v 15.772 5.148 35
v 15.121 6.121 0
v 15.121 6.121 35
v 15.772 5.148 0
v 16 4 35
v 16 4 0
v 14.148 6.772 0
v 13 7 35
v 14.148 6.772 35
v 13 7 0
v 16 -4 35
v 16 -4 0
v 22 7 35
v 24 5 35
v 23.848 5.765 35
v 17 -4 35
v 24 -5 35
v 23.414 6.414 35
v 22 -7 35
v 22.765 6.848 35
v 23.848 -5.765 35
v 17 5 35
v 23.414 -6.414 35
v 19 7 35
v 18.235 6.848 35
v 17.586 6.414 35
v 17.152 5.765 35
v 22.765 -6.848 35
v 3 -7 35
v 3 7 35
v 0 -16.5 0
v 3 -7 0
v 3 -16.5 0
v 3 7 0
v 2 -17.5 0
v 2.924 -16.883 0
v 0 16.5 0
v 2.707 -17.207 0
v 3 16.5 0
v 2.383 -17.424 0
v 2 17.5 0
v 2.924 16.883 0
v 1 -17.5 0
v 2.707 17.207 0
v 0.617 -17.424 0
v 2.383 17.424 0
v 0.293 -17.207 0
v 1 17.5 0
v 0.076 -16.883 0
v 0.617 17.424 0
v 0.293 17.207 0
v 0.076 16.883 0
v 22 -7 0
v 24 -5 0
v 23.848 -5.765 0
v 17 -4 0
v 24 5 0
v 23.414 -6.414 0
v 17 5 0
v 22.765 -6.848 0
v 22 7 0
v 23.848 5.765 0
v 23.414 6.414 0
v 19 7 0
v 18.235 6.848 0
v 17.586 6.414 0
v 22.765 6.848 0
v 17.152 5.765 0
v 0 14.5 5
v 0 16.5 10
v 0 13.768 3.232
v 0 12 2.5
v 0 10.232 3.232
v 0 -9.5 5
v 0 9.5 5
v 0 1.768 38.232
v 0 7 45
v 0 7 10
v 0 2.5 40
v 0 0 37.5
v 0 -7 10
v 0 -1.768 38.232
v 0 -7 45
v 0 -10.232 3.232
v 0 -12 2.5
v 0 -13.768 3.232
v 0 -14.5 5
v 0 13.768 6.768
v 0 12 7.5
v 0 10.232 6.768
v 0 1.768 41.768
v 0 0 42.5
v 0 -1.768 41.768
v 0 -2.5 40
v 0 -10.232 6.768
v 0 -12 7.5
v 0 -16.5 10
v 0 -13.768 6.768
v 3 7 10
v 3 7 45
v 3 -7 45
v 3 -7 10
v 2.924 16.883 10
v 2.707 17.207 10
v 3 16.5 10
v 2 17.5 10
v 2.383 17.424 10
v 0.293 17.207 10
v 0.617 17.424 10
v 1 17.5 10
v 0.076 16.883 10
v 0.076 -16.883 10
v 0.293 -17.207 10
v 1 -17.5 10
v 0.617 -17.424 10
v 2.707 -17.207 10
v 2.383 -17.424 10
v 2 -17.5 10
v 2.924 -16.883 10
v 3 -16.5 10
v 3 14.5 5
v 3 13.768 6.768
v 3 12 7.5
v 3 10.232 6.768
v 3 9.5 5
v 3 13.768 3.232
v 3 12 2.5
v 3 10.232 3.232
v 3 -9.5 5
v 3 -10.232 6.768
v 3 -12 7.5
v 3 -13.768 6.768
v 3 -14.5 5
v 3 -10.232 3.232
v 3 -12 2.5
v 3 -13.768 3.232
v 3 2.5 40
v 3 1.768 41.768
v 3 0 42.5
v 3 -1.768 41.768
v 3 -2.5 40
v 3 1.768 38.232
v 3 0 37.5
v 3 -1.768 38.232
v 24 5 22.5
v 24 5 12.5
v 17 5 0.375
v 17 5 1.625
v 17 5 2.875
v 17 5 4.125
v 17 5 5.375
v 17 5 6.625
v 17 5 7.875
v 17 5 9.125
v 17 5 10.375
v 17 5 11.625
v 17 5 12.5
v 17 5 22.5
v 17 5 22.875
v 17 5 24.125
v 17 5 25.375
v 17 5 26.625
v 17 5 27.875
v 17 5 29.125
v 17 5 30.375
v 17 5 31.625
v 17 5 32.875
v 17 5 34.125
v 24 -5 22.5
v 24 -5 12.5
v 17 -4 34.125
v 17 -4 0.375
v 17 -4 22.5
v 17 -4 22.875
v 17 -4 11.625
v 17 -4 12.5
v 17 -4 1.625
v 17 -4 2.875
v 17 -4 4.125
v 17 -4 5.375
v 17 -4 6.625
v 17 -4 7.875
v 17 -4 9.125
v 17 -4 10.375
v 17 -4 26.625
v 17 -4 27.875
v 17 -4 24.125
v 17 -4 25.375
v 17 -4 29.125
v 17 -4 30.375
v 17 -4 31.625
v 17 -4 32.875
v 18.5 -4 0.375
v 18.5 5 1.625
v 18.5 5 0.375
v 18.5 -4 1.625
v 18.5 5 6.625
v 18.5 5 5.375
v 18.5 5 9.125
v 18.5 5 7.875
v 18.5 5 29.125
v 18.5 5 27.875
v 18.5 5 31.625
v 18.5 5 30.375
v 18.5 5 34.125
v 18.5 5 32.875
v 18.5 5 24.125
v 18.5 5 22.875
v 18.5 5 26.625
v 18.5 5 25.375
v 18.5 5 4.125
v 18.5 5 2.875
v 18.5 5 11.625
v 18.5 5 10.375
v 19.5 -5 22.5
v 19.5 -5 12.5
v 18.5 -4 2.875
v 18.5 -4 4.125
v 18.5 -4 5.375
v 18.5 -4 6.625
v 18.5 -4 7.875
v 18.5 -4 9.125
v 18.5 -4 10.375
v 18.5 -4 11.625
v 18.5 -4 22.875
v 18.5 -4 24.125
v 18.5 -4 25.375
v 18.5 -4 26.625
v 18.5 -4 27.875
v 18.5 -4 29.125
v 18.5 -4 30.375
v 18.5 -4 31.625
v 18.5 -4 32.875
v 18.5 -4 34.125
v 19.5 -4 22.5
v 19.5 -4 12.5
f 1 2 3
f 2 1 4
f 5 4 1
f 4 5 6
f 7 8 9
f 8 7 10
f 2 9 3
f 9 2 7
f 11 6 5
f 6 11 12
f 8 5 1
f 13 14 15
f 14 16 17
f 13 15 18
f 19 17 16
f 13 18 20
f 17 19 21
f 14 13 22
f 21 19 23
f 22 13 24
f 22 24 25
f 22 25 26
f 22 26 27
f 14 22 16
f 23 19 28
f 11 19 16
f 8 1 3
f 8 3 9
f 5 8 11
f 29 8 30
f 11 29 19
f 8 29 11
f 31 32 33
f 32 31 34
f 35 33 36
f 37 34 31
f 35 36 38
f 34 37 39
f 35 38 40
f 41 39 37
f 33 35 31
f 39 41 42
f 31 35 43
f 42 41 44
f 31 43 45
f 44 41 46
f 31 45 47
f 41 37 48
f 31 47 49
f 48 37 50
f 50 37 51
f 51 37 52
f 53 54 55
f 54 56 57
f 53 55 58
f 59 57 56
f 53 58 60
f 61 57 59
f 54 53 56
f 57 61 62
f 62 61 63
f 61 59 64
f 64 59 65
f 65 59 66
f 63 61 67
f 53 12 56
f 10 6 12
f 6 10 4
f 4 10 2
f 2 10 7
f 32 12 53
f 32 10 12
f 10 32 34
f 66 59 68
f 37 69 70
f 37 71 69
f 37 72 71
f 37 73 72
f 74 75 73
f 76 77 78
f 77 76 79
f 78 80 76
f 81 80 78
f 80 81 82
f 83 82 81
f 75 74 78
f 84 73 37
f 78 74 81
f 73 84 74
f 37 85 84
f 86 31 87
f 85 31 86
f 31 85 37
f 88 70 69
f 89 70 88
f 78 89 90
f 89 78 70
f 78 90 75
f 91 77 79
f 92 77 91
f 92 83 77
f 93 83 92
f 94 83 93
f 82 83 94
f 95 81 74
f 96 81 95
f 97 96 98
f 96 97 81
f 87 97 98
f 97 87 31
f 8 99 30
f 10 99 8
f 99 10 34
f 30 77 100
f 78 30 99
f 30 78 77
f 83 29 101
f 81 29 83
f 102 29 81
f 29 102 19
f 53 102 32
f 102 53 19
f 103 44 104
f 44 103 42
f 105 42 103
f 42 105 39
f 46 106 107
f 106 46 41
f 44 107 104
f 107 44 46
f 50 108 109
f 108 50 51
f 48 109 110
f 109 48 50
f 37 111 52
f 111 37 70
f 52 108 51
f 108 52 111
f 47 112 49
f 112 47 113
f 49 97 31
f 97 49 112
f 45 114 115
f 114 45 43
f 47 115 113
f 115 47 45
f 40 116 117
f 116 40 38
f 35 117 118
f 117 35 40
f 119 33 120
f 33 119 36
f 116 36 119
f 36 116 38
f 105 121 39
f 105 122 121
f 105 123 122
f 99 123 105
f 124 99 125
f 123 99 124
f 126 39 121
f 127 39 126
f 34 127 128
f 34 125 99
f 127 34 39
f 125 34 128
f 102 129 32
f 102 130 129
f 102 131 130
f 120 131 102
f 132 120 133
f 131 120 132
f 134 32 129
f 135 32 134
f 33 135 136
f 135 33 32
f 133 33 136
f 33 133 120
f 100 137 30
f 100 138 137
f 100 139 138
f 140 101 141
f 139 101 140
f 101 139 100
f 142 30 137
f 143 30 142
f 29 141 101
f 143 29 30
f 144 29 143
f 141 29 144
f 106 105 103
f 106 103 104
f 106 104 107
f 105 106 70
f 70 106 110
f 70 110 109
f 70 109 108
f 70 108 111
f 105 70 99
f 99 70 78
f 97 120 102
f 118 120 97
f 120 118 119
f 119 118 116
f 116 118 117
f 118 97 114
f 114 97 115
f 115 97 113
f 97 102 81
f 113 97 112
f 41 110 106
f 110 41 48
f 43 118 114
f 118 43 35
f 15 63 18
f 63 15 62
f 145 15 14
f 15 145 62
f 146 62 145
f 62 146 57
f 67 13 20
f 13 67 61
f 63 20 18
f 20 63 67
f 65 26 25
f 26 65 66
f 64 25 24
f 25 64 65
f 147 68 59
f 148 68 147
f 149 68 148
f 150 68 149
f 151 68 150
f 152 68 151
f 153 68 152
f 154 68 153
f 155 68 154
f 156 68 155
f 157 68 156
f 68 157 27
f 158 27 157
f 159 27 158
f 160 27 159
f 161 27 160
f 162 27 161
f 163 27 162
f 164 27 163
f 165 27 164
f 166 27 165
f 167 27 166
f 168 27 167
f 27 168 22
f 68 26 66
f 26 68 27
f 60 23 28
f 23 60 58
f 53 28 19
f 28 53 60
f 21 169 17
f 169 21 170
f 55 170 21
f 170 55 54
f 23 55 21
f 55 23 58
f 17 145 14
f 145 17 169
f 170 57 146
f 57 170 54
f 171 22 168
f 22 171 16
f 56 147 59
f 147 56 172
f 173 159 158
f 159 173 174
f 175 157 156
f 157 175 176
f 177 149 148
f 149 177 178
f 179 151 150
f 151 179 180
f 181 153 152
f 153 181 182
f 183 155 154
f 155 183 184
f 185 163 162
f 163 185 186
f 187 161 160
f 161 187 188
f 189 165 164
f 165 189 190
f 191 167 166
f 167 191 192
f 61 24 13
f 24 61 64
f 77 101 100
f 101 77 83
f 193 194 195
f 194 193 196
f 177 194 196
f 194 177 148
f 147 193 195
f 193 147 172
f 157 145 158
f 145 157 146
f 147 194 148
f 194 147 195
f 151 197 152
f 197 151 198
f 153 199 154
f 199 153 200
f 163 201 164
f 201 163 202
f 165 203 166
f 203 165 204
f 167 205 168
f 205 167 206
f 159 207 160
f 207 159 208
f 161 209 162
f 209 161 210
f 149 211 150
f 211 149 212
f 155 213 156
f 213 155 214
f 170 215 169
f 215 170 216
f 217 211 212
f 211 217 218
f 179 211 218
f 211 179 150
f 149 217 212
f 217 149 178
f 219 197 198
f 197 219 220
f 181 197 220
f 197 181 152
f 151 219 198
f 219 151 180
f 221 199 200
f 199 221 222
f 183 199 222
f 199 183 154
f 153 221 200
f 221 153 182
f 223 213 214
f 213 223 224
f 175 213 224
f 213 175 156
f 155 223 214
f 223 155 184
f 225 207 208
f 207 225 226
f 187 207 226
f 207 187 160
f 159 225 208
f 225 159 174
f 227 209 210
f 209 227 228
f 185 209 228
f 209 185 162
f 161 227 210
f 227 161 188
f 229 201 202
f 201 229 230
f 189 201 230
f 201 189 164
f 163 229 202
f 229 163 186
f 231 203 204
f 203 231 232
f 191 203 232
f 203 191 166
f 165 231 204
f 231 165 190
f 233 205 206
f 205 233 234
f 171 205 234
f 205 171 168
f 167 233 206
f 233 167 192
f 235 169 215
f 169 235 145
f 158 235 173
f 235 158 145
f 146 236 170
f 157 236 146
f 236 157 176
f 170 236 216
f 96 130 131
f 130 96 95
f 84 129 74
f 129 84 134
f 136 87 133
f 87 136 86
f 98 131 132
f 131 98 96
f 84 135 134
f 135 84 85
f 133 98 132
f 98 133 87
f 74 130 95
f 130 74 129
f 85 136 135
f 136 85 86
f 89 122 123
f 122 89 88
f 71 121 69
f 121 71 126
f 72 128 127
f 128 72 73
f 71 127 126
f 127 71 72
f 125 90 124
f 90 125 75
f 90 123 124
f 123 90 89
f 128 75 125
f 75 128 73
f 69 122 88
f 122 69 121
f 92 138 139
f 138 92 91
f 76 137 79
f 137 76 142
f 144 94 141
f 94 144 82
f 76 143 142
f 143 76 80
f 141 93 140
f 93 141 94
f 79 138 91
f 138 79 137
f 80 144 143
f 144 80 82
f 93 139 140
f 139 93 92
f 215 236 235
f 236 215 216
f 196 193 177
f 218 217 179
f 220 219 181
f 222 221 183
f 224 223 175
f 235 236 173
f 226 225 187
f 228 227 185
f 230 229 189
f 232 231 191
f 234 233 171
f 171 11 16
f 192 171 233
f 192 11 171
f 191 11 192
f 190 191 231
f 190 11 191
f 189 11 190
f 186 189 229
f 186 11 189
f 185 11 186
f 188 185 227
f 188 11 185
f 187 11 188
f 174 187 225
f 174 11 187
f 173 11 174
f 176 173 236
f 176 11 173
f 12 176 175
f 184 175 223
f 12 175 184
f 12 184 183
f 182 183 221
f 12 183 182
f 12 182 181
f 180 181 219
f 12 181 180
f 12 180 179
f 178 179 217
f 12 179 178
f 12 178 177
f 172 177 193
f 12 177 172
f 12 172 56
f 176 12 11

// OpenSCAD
// file: inc/metric.scad
// PRUSA Mendel  
// Default metric sizes
// GNU GPL v3
// Josef Průša
// josefprusa@me.com
// prusadjs.cz
// http://www.reprap.org/wiki/Prusa_Mendel
// http://github.com/prusajr/PrusaMendel

// DONT CHANGE THIS FILE! ALTER VALUES IN CONFIGURATION.SCAD INSTEAD

// RODS

threaded_rod_diameter = 8.7;
threaded_rod_diameter_horizontal = 8.7;
smooth_bar_diameter = 8;
smooth_bar_diameter_horizontal = 8.5;

// Nuts and bolts

m8_diameter = 9;
m8_nut_diameter = 14.1;

m4_diameter = 4.5;
m4_nut_diameter = 9;

m3_diameter = 3.6;
m3_nut_diameter = 5.3;
m3_nut_diameter_horizontal = 6.1;

// Bushing holder

bushing_core_diameter = smooth_bar_diameter;
bushing_material_thickness = 1;

// Motors

motor_shaft = 5.5;
// file: inc/functions.scad
// PRUSA Mendel  
// Functions used in many files
// GNU GPL v3
// Josef Průša
// josefprusa@me.com
// prusadjs.cz
// http://www.reprap.org/wiki/Prusa_Mendel
// http://github.com/prusajr/PrusaMendel


module nut(d,h,horizontal=true){
    cornerdiameter =  (d / 2) / cos (180 / 6);
    cylinder(h = h, r = cornerdiameter, $fn = 6);
    if(horizontal){
        for(i = [1:6]){
            rotate([0,0,60*i]) translate([-cornerdiameter-0.2,0,0]) rotate([0,0,-45]) cube(size = [2,2,h]);
        }
    }
}

// Based on nophead research
module polyhole(d, h, center=false) {
    n = max(round(2 * d),3);
    rotate([0,0,180])
        cylinder(h = h, r = (d / 2) / cos (180 / n), $fn = n);
}

// make it interchangeable between this and cylinder
module cylinder_poly(r, h, center=false){
    polyhole(d=r*2, h=h, center=center);
}

module fillet(radius, height=100, $fn=16) {
    //this creates acutal fillet
    translate([-radius, -radius, -height/2-0.01])
        difference() {
            cube([radius*2, radius*2, height+0.02]);
            cylinder(r=radius, h=height+0.02, $fn=16);
        }
}


module cube_fillet(size, radius=-1, vertical=[3,3,3,3], top=[0,0,0,0], bottom=[0,0,0,0], center=false, $fn=0){
    //
    if (center) {
        cube_fillet_inside(size, radius, vertical, top, bottom, $fn);
    } else {
        translate([size[0]/2, size[1]/2, size[2]/2])
            cube_fillet_inside(size, radius, vertical, top, bottom, $fn);
    }
}

module cube_negative_fillet(size, radius=-1, vertical=[3,3,3,3], top=[0,0,0,0], bottom=[0,0,0,0], $fn=0){

    j=[1,0,1,0];

    for (i=[0:3]) {
        if (radius > -1) {
            rotate([0, 0, 90*i]) translate([size[1-j[i]]/2, size[j[i]]/2, 0]) fillet(radius, size[2], $fn=$fn);
        } else {
            rotate([0, 0, 90*i]) translate([size[1-j[i]]/2, size[j[i]]/2, 0]) fillet(vertical[i], size[2], $fn=$fn);
        }
        rotate([90*i, -90, 0]) translate([size[2]/2, size[j[i]]/2, 0 ]) fillet(top[i], size[1-j[i]], $fn=$fn);
        rotate([90*(4-i), 90, 0]) translate([size[2]/2, size[j[i]]/2, 0]) fillet(bottom[i], size[1-j[i]], $fn=$fn);

    }
}

module cube_fillet_inside(size, radius=-1, vertical=[3,3,3,3], top=[0,0,0,0], bottom=[0,0,0,0], $fn=0){
    //makes CENTERED cube with round corners
    // if you give it radius, it will fillet vertical corners.
    //othervise use vertical, top, bottom arrays
    //when viewed from top, it starts in upper right corner (+x,+y quadrant) , goes counterclockwise
    //top/bottom fillet starts in dorection of Y axis and goes CCW too 


    if (radius == 0) {
        cube(size, center=true);
    } else {
        difference() {
            cube(size, center=true);
            cube_negative_fillet(size, radius, vertical, top, bottom, $fn);
        }
    }
}


module nema17(places=[1,1,1,1], size=15.5, h=10, holes=false, shadow=false, $fn=0){
    for (i=[0:3]) {
        if (places[i] == 1) {
            rotate([0, 0, 90*i]) translate([size, size, 0]) {
                if (holes) {
                    rotate([0, 0, -90*i])  screw(r=1.7, slant=false, head_drop=3, $fn=$fn, h=h+2);
                } else {
                    rotate([0, 0, -90*i]) cylinder(h=h, r=5.5, $fn=$fn);
                }
            }
        }
    }
    if (shadow != false) {
        %translate ([0, 0, shadow+21+3]) cube(size = [42,42,42], center = true);
    }
}

module screw(h=20, r=2, r_head=3.5, head_drop=0, slant=true, poly=false, $fn=0){
    //makes screw with head
    //for substraction as screw hole
    if (poly) {
        cylinder_poly(h=h, r=r, $fn=$fn);
    } else {
        cylinder(h=h, r=r, $fn=$fn);
    }
    if (slant) {
        translate([0, 0, head_drop-0.01]) cylinder(h=r_head, r2=0, r1=r_head, $fn=$fn);
    }

    if (head_drop > 0) {
        translate([0, 0, -0.01]) cylinder(h=head_drop+0.01, r=r_head, $fn=$fn);
    }
}

//cube_fillet([10,20,30], vertical=[3,2,0,0], top=[3,2,0,5], bottom=[3,2,0,5]);
//cube_fillet([10,20,30], radius=2, top=[7,2,7,2]);
// file: configuration.scad
// PRUSA Mendel  
// Configuration file
// GNU GPL v3
// Josef Průša
// josefprusa@me.com
// prusadjs.cz
// http://www.reprap.org/wiki/Prusa_Mendel
// http://github.com/prusajr/PrusaMendel

// PLEASE SELECT ONE OF THE CONFIGURATIONS BELOW
// BY UN-COMMENTING IT

// Uncomment for metric settings
// METRIC METRIC METRIC METRIC METRIC METRIC METRIC METRIC 

include <inc/metric.scad>;

// CUSTOM CUSTOM CUSTOM CUSTOM CUSTOM CUSTOM CUSTOM CUSTOM CUSTOM

thin_wall = 3;


// Linear bearing version
linear = false;
// set false for LM-8UU, true for LM-E-8UU (ignore if linear is set to false)
lme8uu = false;

//Machine dimensions

board_thickness = 16;
board_to_xz_distance = 26;

belt_tooth_distance = 2.5;
belt_tooth_stride = 0.5;

// CHANGE ONLY THE STUFF YOU KNOW
// IT WILL REPLACE DEFAULT SETTING

// RODS

// threaded_rod_diameter = 0;
// threaded_rod_diameter_horizontal = 0;
// smooth_bar_diameter = 0;
// smooth_bar_diameter_horizontal = 0;

// Nuts and bolts

// m8_diameter = 0;
// m8_nut_diameter = 0;

// m4_diameter = 0;
// m4_nut_diameter = 0;

// m3_diameter = 0;
// m3_nut_diameter = 0;

// Bushing holder

// bushing_core_diameter = smooth_bar_diameter;
// bushing_material_thickness = 0;


///counted stuff
m3_nut_diameter_bigger = ((m3_nut_diameter  / 2) / cos (180 / 6))*2;

// functions
include <inc/functions.scad>
// main file
include <configuration.scad>
use <inc/functions.scad>
translate([10+16, 0, 0]){

    %translate([0, 0, 35/2]) cube(size = [20, 6, 35], center = true);
    translate([-24.5+6.5, 0, 17.5]) cube_fillet(size = [16, 14, 35], center = true, vertical=[3,0,0,0], fn=8 );
    translate([-20+5.5, 1.5-7, 17.5]) cube(size = [16, 3, 35], center = true);

    difference(){
        union(){

            translate([-37.5+13, 0, 5]) cube_fillet(size = [3, 35, 10], center = true, radius=1, $fn=8);
            translate([-37.5+13, 0, 22.5]) cube(size = [3, 14, 45], center = true);
            translate([-5.5, 0, 17.5]) cube_fillet(size = [7, 14, 35], center = true, vertical = [2,2,0,2], fn=8);

        }
        translate([-5.5, 0, 17.5]) cube(size = [9, 10, 10], center = true);
        translate([0, -12, 5]) rotate([0, -90, 0]) cylinder(h=50, r= 2.5);
        translate([0, 12, 5]) rotate([0, -90, 0]) cylinder(h=50, r= 2.5);

        translate([0, 0, 40]) rotate([0, -90, 0]) cylinder(h=50, r= 2.5);
        intersection() {
            for (i = [0 : 35/belt_tooth_distance])
            {
                translate([-8.5, 0, 1+i*belt_tooth_distance]) cube(size = [2, 10, belt_tooth_distance*belt_tooth_stride], center = true);
            }
            translate([0, 0, 35/2]) cube(size = [20, 10, 35], center = true);
        }
    }
}
